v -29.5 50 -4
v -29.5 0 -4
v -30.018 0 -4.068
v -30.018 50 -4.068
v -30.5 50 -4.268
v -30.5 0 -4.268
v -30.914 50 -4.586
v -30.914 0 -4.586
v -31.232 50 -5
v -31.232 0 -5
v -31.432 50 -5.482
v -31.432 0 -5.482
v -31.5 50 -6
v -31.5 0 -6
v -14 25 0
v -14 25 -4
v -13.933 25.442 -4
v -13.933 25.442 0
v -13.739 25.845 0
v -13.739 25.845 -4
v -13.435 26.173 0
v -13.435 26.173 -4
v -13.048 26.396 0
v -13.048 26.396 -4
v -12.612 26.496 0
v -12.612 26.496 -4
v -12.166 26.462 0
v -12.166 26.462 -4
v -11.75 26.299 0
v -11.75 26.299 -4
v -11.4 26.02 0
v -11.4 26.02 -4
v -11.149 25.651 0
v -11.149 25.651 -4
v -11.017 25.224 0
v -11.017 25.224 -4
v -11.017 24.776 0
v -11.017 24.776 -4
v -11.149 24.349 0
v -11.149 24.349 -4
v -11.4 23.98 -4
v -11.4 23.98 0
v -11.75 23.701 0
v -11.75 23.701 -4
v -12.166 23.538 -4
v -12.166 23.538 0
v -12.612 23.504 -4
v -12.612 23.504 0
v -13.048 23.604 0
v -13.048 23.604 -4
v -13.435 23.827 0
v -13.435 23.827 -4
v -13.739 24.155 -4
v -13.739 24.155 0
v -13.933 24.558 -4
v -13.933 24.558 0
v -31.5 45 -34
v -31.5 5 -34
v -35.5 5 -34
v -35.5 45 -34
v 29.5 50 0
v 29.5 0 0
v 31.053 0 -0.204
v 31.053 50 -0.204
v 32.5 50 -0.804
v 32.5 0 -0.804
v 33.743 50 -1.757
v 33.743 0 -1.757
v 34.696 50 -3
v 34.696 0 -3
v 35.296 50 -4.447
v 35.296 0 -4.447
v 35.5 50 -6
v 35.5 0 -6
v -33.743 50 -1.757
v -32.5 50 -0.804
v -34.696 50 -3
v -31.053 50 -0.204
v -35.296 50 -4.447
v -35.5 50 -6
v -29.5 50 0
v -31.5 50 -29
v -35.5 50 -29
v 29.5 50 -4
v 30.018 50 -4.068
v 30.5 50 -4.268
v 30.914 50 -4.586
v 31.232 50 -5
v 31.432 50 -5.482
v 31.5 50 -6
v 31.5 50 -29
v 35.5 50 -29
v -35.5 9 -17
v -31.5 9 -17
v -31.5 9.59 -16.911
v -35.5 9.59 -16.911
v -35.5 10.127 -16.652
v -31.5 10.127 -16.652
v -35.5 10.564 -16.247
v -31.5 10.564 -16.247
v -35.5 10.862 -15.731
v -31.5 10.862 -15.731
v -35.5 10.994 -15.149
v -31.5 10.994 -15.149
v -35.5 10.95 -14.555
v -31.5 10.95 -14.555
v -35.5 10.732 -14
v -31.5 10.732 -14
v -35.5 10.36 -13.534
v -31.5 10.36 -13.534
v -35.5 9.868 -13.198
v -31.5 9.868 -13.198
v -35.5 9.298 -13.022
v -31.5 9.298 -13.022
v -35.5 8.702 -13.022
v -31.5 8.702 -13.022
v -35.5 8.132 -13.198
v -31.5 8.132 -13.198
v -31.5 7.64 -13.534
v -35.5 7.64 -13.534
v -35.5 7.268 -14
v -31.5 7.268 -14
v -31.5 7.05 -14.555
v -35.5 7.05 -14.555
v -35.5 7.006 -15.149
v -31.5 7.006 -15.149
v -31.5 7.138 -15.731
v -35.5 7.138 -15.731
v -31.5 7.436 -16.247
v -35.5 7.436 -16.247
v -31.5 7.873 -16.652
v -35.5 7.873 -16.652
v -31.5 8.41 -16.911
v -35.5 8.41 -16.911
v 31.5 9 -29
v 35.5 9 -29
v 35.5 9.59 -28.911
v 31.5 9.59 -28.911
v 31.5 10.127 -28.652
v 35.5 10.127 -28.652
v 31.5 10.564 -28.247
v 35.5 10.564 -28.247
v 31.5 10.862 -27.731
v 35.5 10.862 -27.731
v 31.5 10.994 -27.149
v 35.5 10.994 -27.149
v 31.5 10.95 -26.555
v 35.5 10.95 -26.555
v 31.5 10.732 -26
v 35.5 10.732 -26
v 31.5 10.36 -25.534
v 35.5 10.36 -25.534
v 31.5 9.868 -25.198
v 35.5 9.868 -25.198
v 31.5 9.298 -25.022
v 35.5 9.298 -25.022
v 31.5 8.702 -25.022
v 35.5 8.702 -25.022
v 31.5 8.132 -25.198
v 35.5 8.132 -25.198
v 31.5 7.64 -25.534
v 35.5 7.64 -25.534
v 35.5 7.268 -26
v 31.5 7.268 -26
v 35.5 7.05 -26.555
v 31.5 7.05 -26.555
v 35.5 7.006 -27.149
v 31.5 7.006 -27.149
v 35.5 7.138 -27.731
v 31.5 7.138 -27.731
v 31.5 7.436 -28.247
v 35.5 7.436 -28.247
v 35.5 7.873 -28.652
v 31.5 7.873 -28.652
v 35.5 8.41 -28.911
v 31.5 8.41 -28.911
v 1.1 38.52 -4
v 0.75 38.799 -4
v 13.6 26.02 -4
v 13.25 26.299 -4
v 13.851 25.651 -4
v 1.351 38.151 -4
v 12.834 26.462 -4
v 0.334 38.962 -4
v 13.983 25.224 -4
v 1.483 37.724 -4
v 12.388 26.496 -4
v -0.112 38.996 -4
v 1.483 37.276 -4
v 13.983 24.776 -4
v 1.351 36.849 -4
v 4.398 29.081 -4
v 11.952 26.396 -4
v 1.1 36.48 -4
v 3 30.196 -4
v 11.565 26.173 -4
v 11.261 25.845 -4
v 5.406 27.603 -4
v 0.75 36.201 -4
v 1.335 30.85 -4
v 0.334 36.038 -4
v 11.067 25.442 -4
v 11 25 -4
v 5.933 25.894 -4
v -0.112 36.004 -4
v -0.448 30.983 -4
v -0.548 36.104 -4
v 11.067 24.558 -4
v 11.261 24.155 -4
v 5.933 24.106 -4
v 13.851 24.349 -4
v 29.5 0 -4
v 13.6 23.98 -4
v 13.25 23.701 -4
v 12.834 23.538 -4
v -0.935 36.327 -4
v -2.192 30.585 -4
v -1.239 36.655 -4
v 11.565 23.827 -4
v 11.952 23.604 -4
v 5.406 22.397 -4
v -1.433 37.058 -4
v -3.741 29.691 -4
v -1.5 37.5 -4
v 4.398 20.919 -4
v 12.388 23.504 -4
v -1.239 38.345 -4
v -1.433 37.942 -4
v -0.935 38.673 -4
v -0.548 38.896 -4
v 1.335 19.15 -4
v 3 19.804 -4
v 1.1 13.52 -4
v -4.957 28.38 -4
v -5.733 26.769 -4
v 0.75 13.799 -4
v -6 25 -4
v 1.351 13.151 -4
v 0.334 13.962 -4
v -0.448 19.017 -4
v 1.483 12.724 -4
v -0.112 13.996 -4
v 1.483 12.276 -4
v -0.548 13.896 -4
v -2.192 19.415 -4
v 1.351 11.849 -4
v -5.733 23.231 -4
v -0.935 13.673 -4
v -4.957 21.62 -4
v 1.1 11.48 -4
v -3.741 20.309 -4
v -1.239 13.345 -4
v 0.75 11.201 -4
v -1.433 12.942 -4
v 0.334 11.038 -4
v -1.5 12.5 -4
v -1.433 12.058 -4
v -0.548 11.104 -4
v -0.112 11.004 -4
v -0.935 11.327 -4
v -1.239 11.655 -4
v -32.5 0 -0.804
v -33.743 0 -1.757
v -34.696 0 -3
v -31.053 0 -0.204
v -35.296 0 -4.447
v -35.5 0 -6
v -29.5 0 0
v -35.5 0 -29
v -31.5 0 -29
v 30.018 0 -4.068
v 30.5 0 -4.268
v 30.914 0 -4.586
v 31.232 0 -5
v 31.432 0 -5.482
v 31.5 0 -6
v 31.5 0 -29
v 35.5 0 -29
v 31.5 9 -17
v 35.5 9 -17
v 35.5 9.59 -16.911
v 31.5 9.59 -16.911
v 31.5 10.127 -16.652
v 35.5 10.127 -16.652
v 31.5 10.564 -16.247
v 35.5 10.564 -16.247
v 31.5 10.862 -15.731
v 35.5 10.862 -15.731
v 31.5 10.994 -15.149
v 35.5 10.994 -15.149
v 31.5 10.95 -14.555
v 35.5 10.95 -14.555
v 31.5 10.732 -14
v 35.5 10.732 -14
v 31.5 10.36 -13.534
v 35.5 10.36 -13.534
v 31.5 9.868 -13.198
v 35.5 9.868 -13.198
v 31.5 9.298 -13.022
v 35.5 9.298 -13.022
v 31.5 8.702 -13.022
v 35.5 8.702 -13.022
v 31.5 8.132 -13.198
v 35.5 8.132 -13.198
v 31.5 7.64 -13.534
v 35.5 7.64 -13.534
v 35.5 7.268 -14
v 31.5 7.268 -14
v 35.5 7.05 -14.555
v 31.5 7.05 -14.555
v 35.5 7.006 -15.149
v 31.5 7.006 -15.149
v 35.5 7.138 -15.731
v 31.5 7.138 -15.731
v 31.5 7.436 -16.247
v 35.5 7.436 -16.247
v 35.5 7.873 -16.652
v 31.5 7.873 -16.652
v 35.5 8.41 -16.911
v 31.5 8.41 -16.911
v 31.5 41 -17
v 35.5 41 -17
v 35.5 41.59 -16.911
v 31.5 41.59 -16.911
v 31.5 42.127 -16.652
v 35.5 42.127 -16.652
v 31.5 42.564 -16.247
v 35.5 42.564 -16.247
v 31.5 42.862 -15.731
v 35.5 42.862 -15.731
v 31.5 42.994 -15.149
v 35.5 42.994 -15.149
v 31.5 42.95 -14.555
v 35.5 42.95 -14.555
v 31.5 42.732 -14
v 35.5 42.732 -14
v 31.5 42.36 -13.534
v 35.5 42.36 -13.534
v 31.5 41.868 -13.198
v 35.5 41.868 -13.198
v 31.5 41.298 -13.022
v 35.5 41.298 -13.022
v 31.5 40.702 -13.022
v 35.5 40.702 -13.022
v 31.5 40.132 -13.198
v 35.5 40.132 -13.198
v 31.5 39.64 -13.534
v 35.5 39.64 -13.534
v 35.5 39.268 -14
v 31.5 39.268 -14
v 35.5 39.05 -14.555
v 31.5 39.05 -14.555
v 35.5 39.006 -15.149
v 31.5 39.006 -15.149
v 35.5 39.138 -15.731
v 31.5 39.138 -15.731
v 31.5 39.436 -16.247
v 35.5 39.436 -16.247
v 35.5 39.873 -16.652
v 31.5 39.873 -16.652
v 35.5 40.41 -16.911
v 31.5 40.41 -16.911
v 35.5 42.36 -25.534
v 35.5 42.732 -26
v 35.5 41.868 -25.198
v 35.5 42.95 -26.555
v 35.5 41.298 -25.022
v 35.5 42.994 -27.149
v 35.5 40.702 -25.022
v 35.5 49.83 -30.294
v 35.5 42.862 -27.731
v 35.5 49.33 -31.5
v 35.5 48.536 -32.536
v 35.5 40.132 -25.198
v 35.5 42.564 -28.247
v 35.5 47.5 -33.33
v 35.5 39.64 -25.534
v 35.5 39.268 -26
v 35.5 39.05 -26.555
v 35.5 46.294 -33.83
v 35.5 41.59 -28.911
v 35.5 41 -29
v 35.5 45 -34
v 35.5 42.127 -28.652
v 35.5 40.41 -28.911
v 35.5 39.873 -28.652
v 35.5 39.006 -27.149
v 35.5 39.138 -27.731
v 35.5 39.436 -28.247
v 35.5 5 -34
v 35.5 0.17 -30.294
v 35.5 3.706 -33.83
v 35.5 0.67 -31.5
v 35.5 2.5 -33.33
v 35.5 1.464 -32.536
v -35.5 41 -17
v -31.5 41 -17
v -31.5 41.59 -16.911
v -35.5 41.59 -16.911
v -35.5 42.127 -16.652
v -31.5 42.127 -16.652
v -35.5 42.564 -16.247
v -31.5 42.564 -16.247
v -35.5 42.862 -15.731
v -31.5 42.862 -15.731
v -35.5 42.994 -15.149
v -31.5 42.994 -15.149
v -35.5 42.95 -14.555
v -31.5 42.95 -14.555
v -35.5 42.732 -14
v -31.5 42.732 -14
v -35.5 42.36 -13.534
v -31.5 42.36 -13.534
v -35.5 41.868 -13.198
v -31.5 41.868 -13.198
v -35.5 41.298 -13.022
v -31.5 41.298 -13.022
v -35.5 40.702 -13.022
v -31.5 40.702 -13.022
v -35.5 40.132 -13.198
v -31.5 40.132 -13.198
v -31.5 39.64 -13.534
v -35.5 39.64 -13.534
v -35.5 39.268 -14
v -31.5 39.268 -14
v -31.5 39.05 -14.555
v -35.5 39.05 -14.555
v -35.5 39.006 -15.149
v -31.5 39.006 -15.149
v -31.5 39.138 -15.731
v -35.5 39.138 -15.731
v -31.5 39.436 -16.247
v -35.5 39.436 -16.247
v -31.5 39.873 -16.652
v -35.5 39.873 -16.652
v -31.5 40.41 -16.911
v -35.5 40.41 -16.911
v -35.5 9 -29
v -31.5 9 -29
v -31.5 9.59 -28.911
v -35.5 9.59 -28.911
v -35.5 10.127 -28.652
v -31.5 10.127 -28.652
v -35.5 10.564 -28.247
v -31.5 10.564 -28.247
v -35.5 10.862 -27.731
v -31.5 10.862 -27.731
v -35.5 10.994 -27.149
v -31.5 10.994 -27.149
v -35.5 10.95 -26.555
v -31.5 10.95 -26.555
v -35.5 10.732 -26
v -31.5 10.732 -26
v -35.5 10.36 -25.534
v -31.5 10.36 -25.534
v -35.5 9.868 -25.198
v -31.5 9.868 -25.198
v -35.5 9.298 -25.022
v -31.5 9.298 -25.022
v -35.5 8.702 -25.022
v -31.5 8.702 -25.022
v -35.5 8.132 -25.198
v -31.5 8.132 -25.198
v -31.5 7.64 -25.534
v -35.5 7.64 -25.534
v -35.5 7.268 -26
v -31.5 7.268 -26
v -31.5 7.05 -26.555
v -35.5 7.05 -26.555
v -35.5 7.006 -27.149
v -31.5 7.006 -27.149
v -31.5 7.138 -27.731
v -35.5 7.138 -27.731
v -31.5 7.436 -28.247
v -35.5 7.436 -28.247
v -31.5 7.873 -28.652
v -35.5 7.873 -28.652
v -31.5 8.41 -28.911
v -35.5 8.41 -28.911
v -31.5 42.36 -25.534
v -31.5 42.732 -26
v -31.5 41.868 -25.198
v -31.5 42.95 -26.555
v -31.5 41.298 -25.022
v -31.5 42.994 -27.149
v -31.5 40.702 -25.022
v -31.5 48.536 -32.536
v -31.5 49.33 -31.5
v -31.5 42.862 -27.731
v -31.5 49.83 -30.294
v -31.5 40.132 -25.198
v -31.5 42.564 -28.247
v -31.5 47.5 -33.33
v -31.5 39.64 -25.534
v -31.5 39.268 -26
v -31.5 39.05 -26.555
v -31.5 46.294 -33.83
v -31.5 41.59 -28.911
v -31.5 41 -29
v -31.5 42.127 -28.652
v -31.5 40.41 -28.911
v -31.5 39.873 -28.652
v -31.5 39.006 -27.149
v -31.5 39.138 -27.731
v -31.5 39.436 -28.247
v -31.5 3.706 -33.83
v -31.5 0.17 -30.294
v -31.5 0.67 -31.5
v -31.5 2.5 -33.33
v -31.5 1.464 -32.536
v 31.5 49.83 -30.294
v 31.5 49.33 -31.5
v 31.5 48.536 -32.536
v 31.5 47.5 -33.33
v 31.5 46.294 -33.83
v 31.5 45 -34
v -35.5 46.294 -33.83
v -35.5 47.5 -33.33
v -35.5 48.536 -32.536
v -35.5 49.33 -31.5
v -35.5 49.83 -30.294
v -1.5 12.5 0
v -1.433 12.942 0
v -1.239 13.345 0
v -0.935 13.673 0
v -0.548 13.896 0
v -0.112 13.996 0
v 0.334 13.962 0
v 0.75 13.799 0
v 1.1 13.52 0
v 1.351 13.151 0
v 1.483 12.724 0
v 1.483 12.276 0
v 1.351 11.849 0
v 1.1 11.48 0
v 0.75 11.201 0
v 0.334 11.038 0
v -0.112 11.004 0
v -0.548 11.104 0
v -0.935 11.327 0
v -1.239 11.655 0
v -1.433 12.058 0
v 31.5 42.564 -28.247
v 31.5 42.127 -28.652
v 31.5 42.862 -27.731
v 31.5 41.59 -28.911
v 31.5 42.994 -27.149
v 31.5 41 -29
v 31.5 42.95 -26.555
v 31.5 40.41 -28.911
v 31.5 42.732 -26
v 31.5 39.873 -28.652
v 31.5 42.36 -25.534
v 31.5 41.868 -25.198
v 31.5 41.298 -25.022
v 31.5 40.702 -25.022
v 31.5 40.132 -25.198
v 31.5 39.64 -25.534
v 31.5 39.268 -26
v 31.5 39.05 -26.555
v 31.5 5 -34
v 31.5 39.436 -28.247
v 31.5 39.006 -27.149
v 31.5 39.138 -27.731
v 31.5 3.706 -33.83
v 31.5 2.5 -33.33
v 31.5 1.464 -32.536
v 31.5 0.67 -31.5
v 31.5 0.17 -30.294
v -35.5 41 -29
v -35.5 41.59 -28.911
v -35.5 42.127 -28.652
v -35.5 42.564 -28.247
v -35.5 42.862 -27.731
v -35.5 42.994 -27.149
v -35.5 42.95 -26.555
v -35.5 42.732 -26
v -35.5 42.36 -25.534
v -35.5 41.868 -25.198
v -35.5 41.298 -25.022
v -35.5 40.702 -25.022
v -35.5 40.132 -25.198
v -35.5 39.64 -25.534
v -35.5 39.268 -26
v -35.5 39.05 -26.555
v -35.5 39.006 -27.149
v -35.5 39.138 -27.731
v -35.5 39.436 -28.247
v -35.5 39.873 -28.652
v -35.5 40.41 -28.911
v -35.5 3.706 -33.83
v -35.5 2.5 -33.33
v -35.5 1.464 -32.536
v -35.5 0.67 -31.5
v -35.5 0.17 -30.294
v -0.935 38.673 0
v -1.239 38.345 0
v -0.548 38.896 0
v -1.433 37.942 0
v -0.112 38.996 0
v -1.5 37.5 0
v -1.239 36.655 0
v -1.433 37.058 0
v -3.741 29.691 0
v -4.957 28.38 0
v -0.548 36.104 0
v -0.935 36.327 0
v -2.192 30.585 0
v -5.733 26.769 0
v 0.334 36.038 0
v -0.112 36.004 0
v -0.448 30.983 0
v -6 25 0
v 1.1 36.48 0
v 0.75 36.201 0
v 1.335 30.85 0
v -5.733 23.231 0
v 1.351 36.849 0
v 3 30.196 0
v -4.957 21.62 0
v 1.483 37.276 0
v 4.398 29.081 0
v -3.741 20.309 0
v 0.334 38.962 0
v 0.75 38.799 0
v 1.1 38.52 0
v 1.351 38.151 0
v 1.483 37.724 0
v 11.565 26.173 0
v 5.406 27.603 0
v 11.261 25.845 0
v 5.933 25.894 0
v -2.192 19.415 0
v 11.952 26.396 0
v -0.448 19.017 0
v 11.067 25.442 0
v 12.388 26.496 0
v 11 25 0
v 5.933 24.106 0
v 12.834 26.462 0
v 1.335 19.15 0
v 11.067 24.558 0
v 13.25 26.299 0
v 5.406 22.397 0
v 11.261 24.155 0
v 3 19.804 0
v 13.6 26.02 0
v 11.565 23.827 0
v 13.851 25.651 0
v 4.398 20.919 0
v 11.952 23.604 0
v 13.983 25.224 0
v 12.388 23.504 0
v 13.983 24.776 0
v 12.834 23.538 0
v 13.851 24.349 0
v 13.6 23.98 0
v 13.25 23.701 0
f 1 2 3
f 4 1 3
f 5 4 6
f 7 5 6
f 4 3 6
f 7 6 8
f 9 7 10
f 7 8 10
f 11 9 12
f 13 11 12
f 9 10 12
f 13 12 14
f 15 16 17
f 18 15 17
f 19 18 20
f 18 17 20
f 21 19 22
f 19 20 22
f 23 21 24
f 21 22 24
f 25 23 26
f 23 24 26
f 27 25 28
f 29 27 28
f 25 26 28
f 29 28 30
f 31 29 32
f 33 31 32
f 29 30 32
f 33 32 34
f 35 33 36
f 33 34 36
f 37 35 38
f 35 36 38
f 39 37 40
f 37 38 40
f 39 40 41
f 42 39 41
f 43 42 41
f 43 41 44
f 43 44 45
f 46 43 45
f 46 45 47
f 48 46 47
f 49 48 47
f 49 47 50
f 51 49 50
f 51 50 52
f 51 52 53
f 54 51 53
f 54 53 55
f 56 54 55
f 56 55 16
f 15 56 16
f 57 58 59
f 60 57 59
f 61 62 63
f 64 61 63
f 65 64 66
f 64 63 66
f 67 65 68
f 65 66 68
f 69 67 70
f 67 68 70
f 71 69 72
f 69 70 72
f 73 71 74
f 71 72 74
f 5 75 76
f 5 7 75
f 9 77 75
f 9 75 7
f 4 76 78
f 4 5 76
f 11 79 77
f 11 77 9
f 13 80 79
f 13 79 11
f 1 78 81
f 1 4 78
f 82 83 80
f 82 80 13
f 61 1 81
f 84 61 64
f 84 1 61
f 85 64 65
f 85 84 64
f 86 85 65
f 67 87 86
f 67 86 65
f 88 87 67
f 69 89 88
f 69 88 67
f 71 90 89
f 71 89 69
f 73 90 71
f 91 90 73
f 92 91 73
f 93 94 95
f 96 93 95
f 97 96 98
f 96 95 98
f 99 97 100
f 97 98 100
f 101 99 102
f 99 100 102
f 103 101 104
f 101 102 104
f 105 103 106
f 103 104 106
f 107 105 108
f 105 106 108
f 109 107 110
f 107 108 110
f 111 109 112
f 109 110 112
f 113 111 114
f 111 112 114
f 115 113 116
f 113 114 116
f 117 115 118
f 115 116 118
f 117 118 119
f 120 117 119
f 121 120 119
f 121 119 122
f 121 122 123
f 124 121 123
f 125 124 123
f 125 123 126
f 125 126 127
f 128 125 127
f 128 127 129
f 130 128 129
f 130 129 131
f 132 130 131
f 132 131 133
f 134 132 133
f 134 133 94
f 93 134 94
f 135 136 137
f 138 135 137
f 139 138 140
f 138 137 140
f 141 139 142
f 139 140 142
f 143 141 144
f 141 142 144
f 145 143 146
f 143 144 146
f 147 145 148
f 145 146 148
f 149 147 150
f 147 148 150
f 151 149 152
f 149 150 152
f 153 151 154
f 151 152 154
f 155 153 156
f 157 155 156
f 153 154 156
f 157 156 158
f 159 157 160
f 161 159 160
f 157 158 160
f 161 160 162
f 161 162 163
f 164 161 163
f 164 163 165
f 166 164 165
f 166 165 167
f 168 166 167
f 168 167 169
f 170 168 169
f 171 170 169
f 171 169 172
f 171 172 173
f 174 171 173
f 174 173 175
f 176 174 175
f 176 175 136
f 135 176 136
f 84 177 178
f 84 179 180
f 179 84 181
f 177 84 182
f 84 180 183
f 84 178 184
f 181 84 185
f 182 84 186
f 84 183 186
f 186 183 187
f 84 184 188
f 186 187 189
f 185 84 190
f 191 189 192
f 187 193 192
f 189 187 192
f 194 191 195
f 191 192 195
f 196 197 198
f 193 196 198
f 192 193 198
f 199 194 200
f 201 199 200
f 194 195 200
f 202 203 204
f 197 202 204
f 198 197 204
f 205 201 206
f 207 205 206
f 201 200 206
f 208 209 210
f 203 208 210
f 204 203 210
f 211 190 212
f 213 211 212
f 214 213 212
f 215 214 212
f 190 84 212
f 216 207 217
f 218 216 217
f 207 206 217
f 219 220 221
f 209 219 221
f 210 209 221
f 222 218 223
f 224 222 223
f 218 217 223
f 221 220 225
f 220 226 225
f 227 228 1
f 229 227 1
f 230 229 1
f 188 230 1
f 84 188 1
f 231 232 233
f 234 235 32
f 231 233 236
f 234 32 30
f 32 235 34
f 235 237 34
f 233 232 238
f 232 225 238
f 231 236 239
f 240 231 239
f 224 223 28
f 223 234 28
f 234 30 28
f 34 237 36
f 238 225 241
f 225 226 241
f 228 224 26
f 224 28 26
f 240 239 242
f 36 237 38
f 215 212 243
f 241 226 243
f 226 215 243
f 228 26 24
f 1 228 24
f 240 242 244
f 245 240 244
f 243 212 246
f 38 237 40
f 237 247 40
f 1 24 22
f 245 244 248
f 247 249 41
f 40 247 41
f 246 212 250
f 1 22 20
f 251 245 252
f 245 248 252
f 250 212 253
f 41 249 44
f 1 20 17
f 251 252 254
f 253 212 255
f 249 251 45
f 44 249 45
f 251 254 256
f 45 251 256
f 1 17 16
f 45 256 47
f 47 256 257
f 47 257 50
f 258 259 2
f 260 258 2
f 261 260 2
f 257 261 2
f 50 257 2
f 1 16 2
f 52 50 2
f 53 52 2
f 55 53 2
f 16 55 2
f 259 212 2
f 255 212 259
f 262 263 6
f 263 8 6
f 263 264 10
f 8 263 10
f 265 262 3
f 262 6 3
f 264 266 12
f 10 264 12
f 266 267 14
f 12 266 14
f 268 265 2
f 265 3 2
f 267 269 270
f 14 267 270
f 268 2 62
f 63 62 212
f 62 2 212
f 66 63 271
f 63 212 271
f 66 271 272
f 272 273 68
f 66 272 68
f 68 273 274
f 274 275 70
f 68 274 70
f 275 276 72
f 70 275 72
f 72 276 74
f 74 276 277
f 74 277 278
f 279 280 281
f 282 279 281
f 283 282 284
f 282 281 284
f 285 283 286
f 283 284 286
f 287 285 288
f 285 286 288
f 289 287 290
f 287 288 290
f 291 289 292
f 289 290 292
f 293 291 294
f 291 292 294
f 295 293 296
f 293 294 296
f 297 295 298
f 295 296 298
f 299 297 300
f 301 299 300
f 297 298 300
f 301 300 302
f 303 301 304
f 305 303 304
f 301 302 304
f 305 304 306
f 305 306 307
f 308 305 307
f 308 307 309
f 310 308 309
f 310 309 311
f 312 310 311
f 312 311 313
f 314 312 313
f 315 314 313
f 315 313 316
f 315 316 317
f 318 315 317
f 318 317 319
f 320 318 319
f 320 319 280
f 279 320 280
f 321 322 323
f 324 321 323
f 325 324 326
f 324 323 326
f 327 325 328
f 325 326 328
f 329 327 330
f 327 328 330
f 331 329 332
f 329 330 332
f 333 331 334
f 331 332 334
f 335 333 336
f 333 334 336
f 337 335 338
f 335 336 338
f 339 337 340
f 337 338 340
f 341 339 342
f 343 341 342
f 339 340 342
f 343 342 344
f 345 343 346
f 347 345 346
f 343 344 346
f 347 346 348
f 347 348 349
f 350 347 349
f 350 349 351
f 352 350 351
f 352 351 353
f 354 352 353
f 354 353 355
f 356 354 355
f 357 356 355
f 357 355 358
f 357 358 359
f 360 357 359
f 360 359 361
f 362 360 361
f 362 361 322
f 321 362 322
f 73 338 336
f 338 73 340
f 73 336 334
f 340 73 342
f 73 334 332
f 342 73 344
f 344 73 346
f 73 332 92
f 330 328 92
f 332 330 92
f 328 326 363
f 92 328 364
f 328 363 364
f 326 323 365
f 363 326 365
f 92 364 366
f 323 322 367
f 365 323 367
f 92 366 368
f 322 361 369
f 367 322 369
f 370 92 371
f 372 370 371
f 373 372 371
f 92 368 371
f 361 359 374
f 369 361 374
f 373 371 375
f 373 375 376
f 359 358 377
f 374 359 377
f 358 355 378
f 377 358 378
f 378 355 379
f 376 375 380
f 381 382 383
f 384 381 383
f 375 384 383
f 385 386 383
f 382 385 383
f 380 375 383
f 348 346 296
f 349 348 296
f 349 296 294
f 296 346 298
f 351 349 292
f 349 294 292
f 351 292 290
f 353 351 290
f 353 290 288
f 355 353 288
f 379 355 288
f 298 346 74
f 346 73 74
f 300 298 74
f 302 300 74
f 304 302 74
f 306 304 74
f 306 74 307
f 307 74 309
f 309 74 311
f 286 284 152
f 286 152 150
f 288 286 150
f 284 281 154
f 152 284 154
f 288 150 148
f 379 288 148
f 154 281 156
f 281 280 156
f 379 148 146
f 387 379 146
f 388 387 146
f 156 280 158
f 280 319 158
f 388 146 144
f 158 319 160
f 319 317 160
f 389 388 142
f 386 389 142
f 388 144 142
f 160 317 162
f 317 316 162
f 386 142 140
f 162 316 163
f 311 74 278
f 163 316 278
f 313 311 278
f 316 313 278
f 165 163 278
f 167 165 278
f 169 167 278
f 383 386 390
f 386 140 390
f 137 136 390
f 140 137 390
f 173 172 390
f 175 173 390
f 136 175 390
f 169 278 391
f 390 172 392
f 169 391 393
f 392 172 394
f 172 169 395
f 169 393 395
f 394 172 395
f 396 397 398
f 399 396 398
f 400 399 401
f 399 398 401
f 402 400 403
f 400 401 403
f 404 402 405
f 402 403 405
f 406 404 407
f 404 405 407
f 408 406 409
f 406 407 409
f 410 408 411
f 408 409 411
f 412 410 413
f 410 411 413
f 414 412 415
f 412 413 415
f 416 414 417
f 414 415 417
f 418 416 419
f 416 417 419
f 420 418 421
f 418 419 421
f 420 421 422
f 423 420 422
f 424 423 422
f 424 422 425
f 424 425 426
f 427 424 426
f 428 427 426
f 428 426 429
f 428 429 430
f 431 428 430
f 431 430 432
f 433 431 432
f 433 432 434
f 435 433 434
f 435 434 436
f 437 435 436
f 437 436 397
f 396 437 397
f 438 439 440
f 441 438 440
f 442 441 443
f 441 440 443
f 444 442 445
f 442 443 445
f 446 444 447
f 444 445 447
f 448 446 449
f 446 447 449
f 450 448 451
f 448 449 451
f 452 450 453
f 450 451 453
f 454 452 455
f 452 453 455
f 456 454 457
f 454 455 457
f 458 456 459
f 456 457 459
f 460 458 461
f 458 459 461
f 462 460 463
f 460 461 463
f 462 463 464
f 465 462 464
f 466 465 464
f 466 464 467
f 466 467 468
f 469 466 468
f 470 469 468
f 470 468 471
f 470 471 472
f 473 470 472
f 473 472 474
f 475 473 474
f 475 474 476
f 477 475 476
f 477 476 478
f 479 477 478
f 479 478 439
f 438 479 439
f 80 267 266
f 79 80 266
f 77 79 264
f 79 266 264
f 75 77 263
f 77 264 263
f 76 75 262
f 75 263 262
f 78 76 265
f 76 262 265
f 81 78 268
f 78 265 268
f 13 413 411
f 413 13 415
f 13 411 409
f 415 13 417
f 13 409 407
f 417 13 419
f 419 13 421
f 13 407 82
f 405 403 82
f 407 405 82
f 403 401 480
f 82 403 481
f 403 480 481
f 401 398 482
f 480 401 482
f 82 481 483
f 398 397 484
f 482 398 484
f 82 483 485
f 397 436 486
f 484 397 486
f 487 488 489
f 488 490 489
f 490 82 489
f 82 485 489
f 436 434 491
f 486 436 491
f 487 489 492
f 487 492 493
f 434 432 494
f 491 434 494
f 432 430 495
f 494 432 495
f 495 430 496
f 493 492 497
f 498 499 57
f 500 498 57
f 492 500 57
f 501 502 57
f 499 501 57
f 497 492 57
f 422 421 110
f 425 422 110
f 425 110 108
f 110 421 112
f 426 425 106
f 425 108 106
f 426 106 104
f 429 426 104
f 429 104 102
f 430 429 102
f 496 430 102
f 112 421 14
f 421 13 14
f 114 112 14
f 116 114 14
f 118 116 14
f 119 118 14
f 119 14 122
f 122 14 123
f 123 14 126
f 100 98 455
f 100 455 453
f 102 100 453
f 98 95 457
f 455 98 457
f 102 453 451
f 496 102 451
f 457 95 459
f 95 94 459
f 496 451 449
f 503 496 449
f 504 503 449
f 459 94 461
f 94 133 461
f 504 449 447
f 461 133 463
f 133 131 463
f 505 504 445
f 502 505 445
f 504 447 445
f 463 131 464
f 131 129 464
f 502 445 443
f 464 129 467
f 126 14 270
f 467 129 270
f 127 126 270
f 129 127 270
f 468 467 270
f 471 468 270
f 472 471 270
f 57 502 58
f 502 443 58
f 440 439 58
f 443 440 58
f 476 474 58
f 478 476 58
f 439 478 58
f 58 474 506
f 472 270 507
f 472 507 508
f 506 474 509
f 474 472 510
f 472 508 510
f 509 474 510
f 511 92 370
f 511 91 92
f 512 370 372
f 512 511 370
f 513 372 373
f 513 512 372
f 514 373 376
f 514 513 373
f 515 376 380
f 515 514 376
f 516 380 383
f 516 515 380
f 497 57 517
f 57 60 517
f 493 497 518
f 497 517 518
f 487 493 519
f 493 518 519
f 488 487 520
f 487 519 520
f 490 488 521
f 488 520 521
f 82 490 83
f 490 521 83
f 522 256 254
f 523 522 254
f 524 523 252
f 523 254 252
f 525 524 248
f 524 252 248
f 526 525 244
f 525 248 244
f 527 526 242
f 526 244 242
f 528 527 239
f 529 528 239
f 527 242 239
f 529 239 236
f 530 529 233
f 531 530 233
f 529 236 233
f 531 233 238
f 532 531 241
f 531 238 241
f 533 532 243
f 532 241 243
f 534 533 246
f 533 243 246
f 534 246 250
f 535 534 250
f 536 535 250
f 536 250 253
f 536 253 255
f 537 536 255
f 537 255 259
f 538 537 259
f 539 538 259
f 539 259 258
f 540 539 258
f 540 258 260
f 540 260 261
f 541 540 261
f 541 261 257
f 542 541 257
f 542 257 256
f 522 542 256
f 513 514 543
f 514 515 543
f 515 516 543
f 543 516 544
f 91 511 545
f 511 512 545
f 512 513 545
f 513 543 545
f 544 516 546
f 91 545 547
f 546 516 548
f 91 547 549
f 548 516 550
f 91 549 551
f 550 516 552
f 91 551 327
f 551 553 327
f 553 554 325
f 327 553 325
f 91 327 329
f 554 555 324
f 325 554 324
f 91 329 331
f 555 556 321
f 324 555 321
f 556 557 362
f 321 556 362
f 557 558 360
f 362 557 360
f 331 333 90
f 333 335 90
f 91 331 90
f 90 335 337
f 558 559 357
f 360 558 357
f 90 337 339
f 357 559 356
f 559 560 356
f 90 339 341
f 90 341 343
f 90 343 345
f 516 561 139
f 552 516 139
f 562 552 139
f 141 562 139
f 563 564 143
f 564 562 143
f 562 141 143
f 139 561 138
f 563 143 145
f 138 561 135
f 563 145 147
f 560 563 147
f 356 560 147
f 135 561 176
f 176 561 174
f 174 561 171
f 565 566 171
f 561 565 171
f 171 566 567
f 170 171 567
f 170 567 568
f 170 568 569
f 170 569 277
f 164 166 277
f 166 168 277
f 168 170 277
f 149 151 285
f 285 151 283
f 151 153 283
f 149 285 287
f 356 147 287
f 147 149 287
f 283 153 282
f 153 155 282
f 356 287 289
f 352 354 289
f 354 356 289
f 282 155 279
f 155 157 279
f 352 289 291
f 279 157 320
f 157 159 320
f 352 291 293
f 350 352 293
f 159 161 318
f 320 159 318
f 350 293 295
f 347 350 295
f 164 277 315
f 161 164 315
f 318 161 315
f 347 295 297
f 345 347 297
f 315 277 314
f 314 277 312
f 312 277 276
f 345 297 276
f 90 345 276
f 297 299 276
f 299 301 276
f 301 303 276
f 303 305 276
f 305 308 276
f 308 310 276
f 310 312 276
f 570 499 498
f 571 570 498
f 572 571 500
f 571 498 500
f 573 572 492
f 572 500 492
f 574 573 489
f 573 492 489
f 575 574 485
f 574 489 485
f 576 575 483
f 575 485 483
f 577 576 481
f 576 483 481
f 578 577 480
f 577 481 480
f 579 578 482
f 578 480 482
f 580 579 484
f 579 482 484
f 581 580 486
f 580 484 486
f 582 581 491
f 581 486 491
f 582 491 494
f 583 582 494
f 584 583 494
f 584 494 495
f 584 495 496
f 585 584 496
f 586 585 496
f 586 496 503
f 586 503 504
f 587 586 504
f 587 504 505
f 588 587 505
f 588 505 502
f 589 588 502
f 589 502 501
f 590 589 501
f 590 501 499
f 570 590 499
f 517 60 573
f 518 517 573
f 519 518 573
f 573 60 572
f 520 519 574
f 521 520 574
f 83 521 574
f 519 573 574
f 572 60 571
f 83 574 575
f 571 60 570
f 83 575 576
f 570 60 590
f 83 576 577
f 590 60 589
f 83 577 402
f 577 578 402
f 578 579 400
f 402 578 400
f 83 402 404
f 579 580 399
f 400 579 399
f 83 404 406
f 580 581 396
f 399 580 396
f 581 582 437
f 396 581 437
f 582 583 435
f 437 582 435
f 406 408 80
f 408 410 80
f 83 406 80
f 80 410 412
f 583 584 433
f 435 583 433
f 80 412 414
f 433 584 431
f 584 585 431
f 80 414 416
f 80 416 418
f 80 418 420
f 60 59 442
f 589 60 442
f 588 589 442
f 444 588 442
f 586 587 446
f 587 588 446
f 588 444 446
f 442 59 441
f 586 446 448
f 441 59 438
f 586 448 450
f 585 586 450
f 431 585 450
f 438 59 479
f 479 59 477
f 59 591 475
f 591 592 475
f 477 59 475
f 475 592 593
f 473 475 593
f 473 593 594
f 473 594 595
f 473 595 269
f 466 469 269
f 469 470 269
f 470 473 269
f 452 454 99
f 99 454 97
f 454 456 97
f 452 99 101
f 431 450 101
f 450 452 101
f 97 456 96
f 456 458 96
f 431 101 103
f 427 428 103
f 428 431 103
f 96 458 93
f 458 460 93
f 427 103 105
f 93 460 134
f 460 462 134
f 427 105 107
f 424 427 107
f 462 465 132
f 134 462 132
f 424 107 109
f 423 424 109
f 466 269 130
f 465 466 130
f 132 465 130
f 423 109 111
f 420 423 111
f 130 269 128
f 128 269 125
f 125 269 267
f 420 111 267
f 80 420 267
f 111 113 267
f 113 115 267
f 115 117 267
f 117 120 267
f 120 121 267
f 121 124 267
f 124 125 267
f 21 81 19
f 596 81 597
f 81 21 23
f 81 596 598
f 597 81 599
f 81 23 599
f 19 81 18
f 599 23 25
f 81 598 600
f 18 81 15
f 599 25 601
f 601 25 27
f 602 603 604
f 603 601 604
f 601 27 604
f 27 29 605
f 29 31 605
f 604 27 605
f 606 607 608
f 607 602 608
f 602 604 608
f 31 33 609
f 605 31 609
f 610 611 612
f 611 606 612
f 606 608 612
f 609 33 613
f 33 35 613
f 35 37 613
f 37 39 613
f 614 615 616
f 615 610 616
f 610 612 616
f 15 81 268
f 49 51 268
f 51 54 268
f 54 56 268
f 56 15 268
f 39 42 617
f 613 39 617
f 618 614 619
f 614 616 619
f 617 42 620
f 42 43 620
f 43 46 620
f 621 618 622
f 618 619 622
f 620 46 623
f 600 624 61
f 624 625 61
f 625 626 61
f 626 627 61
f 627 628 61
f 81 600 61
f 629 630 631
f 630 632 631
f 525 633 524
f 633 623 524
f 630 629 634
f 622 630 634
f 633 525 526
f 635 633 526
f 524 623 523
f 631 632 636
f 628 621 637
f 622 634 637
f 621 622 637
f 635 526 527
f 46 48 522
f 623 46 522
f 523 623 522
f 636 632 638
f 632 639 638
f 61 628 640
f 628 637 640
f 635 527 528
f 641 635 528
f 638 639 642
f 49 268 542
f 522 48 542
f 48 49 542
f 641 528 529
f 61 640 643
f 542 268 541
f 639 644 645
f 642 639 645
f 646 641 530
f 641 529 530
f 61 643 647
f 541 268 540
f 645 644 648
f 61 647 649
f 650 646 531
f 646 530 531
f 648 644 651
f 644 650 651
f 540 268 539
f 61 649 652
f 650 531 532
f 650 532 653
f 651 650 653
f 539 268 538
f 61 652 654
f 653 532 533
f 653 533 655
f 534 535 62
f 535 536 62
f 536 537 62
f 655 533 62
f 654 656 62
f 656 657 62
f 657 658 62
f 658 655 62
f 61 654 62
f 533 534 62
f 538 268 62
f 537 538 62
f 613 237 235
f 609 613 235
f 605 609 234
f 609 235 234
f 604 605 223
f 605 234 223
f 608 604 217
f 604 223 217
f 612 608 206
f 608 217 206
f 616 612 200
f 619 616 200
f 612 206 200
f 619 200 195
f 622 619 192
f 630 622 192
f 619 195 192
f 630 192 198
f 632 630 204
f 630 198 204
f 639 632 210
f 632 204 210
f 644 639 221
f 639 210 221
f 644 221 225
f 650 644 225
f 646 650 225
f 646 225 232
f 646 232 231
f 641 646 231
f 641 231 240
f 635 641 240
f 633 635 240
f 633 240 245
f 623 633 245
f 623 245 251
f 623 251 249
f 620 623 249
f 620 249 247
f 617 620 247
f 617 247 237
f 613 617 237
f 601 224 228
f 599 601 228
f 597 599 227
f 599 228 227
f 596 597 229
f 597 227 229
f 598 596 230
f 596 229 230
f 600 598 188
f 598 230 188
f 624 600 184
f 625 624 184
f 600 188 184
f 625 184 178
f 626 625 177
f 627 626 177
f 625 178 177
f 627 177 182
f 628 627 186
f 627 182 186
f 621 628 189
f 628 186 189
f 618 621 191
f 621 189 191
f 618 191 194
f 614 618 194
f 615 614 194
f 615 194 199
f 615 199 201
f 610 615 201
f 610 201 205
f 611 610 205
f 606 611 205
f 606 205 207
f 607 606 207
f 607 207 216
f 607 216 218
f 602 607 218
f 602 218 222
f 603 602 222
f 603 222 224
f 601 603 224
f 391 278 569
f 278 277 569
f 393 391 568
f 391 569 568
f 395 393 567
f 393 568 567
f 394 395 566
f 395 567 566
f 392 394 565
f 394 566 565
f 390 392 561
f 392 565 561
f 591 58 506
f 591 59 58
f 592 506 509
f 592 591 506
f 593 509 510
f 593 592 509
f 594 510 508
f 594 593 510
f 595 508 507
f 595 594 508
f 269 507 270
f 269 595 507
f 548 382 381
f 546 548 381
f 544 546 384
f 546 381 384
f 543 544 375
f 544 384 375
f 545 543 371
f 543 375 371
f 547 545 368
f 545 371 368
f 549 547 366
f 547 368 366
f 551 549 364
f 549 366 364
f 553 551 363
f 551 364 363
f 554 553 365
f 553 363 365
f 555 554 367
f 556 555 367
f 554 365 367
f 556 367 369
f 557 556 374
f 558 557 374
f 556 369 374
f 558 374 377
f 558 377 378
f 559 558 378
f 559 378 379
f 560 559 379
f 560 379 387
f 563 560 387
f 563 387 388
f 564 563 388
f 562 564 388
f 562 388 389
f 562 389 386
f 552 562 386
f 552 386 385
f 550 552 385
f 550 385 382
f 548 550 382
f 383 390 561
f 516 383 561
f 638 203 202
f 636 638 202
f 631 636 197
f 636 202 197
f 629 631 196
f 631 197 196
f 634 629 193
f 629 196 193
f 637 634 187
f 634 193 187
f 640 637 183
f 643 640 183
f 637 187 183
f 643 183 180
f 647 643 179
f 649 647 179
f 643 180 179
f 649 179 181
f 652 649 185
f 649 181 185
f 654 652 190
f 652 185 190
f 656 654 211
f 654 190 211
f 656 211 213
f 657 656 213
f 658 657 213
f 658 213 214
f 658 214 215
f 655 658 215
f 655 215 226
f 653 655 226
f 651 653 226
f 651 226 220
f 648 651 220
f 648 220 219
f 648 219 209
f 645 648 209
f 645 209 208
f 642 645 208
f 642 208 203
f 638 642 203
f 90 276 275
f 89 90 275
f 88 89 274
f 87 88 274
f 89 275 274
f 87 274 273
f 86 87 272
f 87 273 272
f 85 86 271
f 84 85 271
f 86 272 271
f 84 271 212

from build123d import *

# Parameters (mm, degrees)
SM_BASE_FLANGE_3_DEPTH = 50
SKETCH_14_R            = 6
SKETCH_14_R_2          = 1.5
CUT_EXTRUDE_1_DEPTH    = 69.26602376
SKETCH_15_R            = 2
CUT_EXTRUDE_2_DEPTH    = 94.257707456
FILLET_1_R             = 5


# Sheet-metal steps are written as plain solids
with BuildPart() as part:
    # 草图1 → 基体-法兰3 (new body)
    with BuildSketch(Plane(origin=(0, 0, 0), x_dir=(1, 0, 0), z_dir=(0, 1, 0))):
        with BuildLine():
            Line((-35.5, 34), (-35.5, 6))
            ThreePointArc((-35.5, 6), (-33.742640687, 1.757359313), (-29.5, 0))
            Line((-29.5, 0), (29.5, 0))
            ThreePointArc((29.5, 0), (33.742640687, 1.757359313), (35.5, 6))
            Line((35.5, 6), (35.5, 34))
            Line((35.5, 34), (31.5, 34))
            Line((31.5, 34), (31.5, 6))
            ThreePointArc((31.5, 6), (30.914213562, 4.585786438), (29.5, 4))
            Line((29.5, 4), (-29.5, 4))
            ThreePointArc((-29.5, 4), (-30.914213562, 4.585786438), (-31.5, 6))
            Line((-31.5, 6), (-31.5, 34))
            Line((-31.5, 34), (-35.5, 34))
        make_face()
    extrude(amount=SM_BASE_FLANGE_3_DEPTH)

    # 草图14 → 切除-拉伸1 (cut, through all)
    with BuildSketch(Plane(origin=(0, 0, -4), x_dir=(-1, 0, 0), z_dir=(0, 0, -1))):
        with Locations((0, 25)):
            Circle(SKETCH_14_R)
        with Locations((0, 37.5)):
            Circle(SKETCH_14_R_2)
        with Locations((12.5, 25)):
            Circle(SKETCH_14_R_2)
        with Locations((0, 12.5)):
            Circle(SKETCH_14_R_2)
        with Locations((-12.5, 25)):
            Circle(SKETCH_14_R_2)
    extrude(amount=-CUT_EXTRUDE_1_DEPTH, mode=Mode.SUBTRACT)

    # 草图15 → 切除-拉伸2 (cut, through all)
    with BuildSketch(Plane(origin=(35.5, 0, 0), x_dir=(0, 0, -1), z_dir=(1, 0, 0))):
        with Locations((15, 9)):
            Circle(SKETCH_15_R)
        with Locations((15, 41)):
            Circle(SKETCH_15_R)
        with Locations((27, 41)):
            Circle(SKETCH_15_R)
        with Locations((27, 9)):
            Circle(SKETCH_15_R)
    extrude(amount=-CUT_EXTRUDE_2_DEPTH, mode=Mode.SUBTRACT)

    # 圆角1
    fillet_1_edges = [part.edges().sort_by_distance(p)[0] for p in [
        (-33.5, 0, -34),
        (33.5, 0, -34),
        (-33.5, 50, -34),
        (33.5, 50, -34),
    ]]
    fillet(fillet_1_edges, radius=FILLET_1_R)


solid = part.part
